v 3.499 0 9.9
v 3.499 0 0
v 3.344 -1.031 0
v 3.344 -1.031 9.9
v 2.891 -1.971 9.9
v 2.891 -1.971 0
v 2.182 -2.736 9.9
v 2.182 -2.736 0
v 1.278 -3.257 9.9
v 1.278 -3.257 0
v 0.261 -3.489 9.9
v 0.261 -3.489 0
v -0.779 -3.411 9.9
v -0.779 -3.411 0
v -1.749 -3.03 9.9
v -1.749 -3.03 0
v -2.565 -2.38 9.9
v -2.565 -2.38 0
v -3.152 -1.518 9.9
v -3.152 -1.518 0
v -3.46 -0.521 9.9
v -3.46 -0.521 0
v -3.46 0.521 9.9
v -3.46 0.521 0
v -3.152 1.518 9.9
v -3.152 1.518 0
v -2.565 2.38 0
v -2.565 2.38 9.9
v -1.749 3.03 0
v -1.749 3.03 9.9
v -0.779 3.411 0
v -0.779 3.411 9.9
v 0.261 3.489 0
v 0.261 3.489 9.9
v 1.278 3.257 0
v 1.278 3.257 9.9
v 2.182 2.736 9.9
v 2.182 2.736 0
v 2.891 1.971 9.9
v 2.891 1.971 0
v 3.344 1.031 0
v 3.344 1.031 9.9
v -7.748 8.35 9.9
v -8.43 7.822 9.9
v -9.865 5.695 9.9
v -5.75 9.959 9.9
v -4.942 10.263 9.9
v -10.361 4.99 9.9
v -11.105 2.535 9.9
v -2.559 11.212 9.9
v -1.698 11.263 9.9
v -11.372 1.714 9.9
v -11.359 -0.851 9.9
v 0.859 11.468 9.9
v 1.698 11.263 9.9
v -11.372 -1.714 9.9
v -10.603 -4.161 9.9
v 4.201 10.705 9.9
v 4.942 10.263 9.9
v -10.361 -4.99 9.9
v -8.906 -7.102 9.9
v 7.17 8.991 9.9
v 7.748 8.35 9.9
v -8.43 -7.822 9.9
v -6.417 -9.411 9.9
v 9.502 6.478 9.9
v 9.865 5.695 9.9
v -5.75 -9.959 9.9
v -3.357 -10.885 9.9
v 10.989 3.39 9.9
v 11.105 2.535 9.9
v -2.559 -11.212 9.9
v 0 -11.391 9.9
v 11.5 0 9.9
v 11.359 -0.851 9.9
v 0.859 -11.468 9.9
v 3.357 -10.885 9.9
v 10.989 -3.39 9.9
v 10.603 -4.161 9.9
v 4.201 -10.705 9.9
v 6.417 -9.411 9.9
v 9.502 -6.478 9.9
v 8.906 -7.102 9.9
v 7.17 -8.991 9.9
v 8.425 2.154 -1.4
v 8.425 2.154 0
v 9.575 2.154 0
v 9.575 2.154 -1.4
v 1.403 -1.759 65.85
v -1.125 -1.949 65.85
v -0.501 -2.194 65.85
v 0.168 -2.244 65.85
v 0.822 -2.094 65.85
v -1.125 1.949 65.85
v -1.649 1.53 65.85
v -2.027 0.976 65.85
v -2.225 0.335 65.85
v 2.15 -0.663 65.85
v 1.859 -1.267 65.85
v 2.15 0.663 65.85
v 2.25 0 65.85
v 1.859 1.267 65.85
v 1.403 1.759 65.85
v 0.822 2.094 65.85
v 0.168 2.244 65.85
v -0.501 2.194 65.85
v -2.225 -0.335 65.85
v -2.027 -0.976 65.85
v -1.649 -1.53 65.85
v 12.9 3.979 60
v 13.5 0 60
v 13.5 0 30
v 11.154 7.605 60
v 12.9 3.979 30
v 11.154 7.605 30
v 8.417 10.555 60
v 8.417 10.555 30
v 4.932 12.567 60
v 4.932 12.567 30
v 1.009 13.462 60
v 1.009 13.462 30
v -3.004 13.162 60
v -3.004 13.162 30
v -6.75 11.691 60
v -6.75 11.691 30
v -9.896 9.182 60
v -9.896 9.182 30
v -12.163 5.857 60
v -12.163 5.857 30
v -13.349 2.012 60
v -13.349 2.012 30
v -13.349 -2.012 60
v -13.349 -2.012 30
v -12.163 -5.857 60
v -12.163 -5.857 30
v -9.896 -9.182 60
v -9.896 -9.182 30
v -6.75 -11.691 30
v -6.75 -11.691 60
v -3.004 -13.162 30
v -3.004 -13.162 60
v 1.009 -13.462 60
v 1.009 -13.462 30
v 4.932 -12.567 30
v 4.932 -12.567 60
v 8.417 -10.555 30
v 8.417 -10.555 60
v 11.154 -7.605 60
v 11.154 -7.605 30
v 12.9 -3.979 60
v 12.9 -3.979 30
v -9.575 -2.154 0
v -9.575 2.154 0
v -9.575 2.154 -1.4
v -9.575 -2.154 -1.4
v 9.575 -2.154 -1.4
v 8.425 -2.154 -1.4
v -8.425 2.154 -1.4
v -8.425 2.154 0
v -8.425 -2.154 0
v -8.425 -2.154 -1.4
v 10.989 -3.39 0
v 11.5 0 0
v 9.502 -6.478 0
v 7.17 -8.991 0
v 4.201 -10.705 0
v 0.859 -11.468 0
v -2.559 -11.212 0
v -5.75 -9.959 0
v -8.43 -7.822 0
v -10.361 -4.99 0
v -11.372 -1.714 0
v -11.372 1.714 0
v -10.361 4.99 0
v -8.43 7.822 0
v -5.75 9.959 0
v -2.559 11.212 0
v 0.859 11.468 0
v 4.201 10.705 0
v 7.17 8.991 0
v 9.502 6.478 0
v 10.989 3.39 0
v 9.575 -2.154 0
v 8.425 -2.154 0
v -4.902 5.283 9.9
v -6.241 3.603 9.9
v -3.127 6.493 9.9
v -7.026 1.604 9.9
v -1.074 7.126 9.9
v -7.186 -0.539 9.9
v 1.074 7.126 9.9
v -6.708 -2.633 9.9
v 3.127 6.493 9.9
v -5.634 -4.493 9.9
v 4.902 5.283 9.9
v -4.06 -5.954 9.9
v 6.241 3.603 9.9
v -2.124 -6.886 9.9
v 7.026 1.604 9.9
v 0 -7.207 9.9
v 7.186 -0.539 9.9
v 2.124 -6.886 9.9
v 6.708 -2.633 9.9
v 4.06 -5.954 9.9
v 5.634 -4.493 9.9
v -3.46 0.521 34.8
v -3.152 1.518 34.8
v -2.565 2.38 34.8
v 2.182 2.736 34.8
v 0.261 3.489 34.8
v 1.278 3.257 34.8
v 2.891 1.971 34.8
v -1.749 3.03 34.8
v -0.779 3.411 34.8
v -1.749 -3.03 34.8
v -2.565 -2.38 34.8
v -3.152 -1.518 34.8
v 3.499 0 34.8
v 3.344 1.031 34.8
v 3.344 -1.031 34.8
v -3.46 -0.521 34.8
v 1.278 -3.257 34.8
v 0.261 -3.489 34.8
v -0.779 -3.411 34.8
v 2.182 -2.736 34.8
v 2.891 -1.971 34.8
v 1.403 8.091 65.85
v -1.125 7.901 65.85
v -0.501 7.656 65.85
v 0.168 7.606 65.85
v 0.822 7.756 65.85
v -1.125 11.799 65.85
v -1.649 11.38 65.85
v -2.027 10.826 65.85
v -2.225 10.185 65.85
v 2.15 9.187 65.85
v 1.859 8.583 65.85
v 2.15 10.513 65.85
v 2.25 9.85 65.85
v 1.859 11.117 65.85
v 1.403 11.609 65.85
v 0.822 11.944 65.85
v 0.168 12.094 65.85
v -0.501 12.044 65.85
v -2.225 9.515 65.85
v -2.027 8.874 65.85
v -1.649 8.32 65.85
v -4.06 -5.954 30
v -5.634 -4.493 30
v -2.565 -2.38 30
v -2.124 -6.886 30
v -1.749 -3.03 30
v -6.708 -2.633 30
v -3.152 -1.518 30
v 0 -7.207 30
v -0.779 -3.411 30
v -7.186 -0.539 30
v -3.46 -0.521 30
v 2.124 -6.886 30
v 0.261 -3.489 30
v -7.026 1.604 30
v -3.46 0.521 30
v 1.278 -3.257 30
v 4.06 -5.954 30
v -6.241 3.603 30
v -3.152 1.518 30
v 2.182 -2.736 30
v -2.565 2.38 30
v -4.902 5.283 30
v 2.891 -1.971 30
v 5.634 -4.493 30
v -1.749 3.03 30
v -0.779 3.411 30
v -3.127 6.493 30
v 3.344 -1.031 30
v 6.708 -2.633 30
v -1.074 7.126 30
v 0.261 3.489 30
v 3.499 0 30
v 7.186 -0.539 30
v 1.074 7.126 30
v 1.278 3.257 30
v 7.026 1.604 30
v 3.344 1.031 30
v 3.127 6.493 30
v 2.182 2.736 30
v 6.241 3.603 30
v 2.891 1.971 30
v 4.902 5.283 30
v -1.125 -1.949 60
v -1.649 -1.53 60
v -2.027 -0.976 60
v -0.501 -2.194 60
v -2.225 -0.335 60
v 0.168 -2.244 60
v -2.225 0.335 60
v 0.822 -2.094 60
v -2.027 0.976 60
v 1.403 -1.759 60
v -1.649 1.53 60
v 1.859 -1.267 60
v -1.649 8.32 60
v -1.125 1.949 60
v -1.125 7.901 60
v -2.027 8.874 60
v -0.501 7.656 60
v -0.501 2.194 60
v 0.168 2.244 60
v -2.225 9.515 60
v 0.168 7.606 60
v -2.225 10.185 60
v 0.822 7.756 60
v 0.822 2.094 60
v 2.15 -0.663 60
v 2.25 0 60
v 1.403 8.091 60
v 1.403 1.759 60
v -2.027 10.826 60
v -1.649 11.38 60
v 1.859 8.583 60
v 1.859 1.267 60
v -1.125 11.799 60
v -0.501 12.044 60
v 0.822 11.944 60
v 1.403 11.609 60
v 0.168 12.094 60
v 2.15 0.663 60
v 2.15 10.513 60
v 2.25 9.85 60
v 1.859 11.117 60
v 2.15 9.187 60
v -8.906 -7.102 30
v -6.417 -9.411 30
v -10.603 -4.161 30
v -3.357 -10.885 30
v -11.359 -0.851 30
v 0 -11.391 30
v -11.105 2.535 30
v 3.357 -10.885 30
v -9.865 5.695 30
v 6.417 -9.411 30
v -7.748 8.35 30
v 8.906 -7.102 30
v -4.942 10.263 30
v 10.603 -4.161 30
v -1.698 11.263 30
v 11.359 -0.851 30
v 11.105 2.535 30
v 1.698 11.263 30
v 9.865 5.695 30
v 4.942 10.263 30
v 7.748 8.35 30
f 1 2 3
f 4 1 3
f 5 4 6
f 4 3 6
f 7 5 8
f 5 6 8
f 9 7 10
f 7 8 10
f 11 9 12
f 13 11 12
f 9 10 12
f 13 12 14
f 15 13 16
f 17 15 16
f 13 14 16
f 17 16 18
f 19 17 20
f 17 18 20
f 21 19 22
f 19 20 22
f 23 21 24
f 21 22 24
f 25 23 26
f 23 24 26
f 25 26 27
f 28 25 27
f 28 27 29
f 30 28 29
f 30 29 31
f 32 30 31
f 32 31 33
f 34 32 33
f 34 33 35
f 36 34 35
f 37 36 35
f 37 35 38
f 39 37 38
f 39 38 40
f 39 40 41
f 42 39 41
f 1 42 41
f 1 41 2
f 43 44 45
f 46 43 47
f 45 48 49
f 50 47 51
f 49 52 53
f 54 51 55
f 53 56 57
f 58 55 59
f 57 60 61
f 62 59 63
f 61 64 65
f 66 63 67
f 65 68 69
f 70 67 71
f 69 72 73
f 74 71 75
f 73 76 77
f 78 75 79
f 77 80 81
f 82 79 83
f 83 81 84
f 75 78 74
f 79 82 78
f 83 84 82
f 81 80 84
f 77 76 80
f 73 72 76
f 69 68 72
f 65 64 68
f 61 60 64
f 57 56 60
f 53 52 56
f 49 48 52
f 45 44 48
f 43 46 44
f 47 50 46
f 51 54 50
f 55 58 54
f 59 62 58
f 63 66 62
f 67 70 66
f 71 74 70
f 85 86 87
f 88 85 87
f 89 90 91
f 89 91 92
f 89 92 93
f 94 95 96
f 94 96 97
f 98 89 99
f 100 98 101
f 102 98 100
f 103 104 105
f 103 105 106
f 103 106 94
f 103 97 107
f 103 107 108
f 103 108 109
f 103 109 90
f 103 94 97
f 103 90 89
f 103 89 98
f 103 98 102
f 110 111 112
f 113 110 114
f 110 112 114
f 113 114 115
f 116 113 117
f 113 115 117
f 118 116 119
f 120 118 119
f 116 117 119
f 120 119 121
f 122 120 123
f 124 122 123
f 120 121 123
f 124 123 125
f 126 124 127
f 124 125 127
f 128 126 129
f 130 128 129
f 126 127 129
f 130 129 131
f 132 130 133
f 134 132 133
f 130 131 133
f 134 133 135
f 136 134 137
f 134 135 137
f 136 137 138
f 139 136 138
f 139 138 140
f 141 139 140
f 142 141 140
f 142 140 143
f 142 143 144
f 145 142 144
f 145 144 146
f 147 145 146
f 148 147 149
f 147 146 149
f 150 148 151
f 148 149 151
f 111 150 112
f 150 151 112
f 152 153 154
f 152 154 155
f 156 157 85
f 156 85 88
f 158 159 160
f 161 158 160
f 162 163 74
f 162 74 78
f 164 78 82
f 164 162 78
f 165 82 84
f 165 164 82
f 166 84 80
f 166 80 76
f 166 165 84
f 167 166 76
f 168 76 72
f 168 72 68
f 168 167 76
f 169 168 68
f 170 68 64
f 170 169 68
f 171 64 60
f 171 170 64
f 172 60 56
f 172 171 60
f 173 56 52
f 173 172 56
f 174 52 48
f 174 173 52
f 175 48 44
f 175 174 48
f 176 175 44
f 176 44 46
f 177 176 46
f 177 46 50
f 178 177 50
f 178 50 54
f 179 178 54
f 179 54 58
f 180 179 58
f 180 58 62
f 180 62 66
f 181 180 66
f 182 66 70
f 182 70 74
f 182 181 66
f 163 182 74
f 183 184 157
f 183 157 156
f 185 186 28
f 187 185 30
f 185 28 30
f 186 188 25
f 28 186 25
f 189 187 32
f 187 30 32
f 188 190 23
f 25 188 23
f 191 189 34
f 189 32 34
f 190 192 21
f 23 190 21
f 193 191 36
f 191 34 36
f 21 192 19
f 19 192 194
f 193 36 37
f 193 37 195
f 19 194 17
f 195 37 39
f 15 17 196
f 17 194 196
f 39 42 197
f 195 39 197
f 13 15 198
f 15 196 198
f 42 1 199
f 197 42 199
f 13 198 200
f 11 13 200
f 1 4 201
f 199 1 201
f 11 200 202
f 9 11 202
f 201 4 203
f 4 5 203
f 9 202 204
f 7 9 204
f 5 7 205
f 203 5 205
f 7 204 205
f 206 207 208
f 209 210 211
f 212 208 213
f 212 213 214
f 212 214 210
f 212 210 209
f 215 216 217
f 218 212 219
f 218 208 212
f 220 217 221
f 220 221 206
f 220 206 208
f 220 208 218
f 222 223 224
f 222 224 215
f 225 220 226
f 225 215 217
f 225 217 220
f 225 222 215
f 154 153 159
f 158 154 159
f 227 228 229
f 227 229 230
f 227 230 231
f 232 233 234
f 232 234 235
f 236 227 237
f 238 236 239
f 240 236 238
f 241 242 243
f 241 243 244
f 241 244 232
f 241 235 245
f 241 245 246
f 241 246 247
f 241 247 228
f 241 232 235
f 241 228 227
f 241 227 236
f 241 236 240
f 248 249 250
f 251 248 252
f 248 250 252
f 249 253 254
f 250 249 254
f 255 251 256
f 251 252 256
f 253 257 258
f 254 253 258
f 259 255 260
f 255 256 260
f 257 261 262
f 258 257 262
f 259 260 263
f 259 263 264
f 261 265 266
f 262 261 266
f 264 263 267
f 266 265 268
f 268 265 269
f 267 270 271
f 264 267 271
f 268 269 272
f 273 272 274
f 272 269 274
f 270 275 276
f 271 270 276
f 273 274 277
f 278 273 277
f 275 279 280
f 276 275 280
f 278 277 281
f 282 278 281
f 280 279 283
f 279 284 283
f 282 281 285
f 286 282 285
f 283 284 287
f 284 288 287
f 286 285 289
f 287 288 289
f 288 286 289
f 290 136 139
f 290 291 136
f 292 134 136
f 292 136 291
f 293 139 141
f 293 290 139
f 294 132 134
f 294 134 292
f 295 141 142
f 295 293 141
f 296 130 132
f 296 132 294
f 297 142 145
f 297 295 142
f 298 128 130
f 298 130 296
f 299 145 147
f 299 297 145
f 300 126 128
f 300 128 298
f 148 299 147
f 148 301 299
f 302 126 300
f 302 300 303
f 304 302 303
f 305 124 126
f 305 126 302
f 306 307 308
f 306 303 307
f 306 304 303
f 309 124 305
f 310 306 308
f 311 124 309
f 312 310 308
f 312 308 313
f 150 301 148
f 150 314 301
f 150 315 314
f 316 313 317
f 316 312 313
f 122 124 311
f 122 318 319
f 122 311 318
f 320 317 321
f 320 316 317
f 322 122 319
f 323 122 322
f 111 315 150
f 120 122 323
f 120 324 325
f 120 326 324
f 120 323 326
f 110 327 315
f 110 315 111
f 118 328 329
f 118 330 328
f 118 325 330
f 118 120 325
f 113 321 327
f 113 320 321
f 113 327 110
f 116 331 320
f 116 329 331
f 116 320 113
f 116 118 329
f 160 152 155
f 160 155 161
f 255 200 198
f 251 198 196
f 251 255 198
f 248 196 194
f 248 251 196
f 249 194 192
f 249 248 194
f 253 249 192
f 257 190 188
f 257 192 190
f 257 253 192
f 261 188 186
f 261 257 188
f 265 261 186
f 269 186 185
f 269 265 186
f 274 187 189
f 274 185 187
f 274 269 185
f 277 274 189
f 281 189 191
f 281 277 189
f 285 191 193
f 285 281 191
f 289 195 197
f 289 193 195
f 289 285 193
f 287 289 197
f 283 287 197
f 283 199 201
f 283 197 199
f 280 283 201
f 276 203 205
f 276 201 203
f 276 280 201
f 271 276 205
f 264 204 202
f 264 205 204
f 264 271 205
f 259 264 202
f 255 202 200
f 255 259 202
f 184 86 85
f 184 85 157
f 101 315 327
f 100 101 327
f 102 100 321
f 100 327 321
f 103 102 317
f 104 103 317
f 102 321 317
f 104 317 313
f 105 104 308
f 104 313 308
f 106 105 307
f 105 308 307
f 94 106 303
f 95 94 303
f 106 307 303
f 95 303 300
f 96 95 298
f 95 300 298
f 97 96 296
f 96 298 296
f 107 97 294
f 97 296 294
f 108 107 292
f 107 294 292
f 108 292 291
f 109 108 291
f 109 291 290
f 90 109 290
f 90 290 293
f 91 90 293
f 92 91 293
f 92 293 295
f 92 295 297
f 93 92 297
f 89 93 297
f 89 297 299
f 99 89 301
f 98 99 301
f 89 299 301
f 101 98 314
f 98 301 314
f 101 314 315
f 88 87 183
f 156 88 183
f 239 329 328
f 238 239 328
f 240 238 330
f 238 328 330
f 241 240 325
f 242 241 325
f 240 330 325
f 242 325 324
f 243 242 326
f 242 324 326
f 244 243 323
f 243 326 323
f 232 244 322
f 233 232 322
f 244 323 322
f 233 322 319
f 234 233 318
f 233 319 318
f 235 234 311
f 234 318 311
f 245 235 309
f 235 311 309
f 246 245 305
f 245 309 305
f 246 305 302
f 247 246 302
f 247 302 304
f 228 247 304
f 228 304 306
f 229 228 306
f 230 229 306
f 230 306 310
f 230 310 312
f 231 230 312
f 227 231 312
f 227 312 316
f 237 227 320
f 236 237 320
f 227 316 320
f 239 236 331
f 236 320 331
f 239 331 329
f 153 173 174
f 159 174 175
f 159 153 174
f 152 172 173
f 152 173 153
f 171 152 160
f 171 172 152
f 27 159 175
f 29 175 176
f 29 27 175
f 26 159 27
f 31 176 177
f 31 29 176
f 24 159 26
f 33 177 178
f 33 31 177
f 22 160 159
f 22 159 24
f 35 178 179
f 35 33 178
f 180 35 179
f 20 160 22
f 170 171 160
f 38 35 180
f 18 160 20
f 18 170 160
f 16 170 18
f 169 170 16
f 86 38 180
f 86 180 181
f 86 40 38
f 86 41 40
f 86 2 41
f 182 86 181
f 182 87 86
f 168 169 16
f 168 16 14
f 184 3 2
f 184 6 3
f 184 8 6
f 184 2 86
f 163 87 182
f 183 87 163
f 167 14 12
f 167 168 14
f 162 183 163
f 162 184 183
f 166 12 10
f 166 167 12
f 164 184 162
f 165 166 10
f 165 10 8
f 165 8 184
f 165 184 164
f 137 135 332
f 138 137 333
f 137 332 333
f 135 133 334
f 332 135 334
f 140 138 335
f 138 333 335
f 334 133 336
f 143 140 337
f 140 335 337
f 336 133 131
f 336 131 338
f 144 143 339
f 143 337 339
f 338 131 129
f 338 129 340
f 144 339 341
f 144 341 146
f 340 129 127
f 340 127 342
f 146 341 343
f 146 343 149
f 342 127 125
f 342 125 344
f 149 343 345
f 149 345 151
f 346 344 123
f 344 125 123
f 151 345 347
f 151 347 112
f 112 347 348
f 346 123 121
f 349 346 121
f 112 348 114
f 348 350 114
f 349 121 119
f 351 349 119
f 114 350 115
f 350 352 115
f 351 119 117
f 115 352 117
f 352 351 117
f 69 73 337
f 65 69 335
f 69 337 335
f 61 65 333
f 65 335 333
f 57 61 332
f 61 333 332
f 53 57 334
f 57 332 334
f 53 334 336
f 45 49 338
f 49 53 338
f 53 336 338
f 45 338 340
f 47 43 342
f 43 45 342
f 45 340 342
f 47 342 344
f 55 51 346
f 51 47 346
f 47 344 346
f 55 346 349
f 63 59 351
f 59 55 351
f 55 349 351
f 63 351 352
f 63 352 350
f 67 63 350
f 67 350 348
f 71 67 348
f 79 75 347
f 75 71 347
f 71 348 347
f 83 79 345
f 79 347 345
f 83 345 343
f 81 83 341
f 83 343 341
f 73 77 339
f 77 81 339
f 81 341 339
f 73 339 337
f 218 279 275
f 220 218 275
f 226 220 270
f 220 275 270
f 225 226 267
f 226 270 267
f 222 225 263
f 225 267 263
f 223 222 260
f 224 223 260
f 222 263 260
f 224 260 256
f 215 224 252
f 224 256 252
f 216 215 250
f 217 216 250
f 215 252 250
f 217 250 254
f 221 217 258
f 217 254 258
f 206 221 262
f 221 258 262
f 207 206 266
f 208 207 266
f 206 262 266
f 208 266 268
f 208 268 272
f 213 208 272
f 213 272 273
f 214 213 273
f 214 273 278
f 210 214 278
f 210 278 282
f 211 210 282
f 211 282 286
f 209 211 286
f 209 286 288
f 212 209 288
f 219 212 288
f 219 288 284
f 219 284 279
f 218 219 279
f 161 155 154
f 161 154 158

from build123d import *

# Parameters (mm, degrees)
F0_W      = 4.18402
F0_H      = 30
F2_R      = 13.5
F3_DEPTH  = 30
F4_R      = 11.5
F5_DEPTH  = 9.9
F6_W      = 1.150094
F6_H      = 4.307738
F7_DEPTH  = 1.4
F6_R      = 3.498999
F8_DEPTH  = 34.8
F9_R      = 2.25
F10_DEPTH = 5.85


with BuildPart() as f1:
    # F0 (on Right) → F1 (revolve)
    with BuildSketch(Plane.YZ):
        with Locations((-9.298615, 15)):
            Rectangle(F0_W, F0_H)
    revolve(axis=Axis((0, 0, 13.057403), (0, 0, -1)))

    # F2 (on face) → F3 (join)
    with BuildSketch(Plane.XY.offset(30)):
        Circle(F2_R)
    extrude(amount=F3_DEPTH)

    # F4 (on face) → F5 (join)
    with BuildSketch(Plane(origin=(0, 0, 0), x_dir=(1, 0, 0), z_dir=(0, 0, -1))):
        Circle(F4_R)
    extrude(amount=-F5_DEPTH)

    # F6 (on face) → F7 (join)
    with BuildSketch(Plane(origin=(0, 0, 0), x_dir=(1, 0, 0), z_dir=(0, 0, -1))):
        with Locations((-9, 0)):
            Rectangle(F6_W, F6_H)
        with Locations((9, 0)):
            Rectangle(F6_W, F6_H)
    extrude(amount=F7_DEPTH)

    # F6 (on face) → F8 (cut)
    with BuildSketch(Plane(origin=(0, 0, 0), x_dir=(1, 0, 0), z_dir=(0, 0, -1))):
        Circle(F6_R)
    extrude(amount=-F8_DEPTH, mode=Mode.SUBTRACT)

    # F9 (on face) → F10 (join)
    with BuildSketch(Plane.XY.offset(60)):
        Circle(F9_R)
        with Locations((0, 9.85)):
            Circle(F9_R)
    extrude(amount=F10_DEPTH)


solid = f1.part
